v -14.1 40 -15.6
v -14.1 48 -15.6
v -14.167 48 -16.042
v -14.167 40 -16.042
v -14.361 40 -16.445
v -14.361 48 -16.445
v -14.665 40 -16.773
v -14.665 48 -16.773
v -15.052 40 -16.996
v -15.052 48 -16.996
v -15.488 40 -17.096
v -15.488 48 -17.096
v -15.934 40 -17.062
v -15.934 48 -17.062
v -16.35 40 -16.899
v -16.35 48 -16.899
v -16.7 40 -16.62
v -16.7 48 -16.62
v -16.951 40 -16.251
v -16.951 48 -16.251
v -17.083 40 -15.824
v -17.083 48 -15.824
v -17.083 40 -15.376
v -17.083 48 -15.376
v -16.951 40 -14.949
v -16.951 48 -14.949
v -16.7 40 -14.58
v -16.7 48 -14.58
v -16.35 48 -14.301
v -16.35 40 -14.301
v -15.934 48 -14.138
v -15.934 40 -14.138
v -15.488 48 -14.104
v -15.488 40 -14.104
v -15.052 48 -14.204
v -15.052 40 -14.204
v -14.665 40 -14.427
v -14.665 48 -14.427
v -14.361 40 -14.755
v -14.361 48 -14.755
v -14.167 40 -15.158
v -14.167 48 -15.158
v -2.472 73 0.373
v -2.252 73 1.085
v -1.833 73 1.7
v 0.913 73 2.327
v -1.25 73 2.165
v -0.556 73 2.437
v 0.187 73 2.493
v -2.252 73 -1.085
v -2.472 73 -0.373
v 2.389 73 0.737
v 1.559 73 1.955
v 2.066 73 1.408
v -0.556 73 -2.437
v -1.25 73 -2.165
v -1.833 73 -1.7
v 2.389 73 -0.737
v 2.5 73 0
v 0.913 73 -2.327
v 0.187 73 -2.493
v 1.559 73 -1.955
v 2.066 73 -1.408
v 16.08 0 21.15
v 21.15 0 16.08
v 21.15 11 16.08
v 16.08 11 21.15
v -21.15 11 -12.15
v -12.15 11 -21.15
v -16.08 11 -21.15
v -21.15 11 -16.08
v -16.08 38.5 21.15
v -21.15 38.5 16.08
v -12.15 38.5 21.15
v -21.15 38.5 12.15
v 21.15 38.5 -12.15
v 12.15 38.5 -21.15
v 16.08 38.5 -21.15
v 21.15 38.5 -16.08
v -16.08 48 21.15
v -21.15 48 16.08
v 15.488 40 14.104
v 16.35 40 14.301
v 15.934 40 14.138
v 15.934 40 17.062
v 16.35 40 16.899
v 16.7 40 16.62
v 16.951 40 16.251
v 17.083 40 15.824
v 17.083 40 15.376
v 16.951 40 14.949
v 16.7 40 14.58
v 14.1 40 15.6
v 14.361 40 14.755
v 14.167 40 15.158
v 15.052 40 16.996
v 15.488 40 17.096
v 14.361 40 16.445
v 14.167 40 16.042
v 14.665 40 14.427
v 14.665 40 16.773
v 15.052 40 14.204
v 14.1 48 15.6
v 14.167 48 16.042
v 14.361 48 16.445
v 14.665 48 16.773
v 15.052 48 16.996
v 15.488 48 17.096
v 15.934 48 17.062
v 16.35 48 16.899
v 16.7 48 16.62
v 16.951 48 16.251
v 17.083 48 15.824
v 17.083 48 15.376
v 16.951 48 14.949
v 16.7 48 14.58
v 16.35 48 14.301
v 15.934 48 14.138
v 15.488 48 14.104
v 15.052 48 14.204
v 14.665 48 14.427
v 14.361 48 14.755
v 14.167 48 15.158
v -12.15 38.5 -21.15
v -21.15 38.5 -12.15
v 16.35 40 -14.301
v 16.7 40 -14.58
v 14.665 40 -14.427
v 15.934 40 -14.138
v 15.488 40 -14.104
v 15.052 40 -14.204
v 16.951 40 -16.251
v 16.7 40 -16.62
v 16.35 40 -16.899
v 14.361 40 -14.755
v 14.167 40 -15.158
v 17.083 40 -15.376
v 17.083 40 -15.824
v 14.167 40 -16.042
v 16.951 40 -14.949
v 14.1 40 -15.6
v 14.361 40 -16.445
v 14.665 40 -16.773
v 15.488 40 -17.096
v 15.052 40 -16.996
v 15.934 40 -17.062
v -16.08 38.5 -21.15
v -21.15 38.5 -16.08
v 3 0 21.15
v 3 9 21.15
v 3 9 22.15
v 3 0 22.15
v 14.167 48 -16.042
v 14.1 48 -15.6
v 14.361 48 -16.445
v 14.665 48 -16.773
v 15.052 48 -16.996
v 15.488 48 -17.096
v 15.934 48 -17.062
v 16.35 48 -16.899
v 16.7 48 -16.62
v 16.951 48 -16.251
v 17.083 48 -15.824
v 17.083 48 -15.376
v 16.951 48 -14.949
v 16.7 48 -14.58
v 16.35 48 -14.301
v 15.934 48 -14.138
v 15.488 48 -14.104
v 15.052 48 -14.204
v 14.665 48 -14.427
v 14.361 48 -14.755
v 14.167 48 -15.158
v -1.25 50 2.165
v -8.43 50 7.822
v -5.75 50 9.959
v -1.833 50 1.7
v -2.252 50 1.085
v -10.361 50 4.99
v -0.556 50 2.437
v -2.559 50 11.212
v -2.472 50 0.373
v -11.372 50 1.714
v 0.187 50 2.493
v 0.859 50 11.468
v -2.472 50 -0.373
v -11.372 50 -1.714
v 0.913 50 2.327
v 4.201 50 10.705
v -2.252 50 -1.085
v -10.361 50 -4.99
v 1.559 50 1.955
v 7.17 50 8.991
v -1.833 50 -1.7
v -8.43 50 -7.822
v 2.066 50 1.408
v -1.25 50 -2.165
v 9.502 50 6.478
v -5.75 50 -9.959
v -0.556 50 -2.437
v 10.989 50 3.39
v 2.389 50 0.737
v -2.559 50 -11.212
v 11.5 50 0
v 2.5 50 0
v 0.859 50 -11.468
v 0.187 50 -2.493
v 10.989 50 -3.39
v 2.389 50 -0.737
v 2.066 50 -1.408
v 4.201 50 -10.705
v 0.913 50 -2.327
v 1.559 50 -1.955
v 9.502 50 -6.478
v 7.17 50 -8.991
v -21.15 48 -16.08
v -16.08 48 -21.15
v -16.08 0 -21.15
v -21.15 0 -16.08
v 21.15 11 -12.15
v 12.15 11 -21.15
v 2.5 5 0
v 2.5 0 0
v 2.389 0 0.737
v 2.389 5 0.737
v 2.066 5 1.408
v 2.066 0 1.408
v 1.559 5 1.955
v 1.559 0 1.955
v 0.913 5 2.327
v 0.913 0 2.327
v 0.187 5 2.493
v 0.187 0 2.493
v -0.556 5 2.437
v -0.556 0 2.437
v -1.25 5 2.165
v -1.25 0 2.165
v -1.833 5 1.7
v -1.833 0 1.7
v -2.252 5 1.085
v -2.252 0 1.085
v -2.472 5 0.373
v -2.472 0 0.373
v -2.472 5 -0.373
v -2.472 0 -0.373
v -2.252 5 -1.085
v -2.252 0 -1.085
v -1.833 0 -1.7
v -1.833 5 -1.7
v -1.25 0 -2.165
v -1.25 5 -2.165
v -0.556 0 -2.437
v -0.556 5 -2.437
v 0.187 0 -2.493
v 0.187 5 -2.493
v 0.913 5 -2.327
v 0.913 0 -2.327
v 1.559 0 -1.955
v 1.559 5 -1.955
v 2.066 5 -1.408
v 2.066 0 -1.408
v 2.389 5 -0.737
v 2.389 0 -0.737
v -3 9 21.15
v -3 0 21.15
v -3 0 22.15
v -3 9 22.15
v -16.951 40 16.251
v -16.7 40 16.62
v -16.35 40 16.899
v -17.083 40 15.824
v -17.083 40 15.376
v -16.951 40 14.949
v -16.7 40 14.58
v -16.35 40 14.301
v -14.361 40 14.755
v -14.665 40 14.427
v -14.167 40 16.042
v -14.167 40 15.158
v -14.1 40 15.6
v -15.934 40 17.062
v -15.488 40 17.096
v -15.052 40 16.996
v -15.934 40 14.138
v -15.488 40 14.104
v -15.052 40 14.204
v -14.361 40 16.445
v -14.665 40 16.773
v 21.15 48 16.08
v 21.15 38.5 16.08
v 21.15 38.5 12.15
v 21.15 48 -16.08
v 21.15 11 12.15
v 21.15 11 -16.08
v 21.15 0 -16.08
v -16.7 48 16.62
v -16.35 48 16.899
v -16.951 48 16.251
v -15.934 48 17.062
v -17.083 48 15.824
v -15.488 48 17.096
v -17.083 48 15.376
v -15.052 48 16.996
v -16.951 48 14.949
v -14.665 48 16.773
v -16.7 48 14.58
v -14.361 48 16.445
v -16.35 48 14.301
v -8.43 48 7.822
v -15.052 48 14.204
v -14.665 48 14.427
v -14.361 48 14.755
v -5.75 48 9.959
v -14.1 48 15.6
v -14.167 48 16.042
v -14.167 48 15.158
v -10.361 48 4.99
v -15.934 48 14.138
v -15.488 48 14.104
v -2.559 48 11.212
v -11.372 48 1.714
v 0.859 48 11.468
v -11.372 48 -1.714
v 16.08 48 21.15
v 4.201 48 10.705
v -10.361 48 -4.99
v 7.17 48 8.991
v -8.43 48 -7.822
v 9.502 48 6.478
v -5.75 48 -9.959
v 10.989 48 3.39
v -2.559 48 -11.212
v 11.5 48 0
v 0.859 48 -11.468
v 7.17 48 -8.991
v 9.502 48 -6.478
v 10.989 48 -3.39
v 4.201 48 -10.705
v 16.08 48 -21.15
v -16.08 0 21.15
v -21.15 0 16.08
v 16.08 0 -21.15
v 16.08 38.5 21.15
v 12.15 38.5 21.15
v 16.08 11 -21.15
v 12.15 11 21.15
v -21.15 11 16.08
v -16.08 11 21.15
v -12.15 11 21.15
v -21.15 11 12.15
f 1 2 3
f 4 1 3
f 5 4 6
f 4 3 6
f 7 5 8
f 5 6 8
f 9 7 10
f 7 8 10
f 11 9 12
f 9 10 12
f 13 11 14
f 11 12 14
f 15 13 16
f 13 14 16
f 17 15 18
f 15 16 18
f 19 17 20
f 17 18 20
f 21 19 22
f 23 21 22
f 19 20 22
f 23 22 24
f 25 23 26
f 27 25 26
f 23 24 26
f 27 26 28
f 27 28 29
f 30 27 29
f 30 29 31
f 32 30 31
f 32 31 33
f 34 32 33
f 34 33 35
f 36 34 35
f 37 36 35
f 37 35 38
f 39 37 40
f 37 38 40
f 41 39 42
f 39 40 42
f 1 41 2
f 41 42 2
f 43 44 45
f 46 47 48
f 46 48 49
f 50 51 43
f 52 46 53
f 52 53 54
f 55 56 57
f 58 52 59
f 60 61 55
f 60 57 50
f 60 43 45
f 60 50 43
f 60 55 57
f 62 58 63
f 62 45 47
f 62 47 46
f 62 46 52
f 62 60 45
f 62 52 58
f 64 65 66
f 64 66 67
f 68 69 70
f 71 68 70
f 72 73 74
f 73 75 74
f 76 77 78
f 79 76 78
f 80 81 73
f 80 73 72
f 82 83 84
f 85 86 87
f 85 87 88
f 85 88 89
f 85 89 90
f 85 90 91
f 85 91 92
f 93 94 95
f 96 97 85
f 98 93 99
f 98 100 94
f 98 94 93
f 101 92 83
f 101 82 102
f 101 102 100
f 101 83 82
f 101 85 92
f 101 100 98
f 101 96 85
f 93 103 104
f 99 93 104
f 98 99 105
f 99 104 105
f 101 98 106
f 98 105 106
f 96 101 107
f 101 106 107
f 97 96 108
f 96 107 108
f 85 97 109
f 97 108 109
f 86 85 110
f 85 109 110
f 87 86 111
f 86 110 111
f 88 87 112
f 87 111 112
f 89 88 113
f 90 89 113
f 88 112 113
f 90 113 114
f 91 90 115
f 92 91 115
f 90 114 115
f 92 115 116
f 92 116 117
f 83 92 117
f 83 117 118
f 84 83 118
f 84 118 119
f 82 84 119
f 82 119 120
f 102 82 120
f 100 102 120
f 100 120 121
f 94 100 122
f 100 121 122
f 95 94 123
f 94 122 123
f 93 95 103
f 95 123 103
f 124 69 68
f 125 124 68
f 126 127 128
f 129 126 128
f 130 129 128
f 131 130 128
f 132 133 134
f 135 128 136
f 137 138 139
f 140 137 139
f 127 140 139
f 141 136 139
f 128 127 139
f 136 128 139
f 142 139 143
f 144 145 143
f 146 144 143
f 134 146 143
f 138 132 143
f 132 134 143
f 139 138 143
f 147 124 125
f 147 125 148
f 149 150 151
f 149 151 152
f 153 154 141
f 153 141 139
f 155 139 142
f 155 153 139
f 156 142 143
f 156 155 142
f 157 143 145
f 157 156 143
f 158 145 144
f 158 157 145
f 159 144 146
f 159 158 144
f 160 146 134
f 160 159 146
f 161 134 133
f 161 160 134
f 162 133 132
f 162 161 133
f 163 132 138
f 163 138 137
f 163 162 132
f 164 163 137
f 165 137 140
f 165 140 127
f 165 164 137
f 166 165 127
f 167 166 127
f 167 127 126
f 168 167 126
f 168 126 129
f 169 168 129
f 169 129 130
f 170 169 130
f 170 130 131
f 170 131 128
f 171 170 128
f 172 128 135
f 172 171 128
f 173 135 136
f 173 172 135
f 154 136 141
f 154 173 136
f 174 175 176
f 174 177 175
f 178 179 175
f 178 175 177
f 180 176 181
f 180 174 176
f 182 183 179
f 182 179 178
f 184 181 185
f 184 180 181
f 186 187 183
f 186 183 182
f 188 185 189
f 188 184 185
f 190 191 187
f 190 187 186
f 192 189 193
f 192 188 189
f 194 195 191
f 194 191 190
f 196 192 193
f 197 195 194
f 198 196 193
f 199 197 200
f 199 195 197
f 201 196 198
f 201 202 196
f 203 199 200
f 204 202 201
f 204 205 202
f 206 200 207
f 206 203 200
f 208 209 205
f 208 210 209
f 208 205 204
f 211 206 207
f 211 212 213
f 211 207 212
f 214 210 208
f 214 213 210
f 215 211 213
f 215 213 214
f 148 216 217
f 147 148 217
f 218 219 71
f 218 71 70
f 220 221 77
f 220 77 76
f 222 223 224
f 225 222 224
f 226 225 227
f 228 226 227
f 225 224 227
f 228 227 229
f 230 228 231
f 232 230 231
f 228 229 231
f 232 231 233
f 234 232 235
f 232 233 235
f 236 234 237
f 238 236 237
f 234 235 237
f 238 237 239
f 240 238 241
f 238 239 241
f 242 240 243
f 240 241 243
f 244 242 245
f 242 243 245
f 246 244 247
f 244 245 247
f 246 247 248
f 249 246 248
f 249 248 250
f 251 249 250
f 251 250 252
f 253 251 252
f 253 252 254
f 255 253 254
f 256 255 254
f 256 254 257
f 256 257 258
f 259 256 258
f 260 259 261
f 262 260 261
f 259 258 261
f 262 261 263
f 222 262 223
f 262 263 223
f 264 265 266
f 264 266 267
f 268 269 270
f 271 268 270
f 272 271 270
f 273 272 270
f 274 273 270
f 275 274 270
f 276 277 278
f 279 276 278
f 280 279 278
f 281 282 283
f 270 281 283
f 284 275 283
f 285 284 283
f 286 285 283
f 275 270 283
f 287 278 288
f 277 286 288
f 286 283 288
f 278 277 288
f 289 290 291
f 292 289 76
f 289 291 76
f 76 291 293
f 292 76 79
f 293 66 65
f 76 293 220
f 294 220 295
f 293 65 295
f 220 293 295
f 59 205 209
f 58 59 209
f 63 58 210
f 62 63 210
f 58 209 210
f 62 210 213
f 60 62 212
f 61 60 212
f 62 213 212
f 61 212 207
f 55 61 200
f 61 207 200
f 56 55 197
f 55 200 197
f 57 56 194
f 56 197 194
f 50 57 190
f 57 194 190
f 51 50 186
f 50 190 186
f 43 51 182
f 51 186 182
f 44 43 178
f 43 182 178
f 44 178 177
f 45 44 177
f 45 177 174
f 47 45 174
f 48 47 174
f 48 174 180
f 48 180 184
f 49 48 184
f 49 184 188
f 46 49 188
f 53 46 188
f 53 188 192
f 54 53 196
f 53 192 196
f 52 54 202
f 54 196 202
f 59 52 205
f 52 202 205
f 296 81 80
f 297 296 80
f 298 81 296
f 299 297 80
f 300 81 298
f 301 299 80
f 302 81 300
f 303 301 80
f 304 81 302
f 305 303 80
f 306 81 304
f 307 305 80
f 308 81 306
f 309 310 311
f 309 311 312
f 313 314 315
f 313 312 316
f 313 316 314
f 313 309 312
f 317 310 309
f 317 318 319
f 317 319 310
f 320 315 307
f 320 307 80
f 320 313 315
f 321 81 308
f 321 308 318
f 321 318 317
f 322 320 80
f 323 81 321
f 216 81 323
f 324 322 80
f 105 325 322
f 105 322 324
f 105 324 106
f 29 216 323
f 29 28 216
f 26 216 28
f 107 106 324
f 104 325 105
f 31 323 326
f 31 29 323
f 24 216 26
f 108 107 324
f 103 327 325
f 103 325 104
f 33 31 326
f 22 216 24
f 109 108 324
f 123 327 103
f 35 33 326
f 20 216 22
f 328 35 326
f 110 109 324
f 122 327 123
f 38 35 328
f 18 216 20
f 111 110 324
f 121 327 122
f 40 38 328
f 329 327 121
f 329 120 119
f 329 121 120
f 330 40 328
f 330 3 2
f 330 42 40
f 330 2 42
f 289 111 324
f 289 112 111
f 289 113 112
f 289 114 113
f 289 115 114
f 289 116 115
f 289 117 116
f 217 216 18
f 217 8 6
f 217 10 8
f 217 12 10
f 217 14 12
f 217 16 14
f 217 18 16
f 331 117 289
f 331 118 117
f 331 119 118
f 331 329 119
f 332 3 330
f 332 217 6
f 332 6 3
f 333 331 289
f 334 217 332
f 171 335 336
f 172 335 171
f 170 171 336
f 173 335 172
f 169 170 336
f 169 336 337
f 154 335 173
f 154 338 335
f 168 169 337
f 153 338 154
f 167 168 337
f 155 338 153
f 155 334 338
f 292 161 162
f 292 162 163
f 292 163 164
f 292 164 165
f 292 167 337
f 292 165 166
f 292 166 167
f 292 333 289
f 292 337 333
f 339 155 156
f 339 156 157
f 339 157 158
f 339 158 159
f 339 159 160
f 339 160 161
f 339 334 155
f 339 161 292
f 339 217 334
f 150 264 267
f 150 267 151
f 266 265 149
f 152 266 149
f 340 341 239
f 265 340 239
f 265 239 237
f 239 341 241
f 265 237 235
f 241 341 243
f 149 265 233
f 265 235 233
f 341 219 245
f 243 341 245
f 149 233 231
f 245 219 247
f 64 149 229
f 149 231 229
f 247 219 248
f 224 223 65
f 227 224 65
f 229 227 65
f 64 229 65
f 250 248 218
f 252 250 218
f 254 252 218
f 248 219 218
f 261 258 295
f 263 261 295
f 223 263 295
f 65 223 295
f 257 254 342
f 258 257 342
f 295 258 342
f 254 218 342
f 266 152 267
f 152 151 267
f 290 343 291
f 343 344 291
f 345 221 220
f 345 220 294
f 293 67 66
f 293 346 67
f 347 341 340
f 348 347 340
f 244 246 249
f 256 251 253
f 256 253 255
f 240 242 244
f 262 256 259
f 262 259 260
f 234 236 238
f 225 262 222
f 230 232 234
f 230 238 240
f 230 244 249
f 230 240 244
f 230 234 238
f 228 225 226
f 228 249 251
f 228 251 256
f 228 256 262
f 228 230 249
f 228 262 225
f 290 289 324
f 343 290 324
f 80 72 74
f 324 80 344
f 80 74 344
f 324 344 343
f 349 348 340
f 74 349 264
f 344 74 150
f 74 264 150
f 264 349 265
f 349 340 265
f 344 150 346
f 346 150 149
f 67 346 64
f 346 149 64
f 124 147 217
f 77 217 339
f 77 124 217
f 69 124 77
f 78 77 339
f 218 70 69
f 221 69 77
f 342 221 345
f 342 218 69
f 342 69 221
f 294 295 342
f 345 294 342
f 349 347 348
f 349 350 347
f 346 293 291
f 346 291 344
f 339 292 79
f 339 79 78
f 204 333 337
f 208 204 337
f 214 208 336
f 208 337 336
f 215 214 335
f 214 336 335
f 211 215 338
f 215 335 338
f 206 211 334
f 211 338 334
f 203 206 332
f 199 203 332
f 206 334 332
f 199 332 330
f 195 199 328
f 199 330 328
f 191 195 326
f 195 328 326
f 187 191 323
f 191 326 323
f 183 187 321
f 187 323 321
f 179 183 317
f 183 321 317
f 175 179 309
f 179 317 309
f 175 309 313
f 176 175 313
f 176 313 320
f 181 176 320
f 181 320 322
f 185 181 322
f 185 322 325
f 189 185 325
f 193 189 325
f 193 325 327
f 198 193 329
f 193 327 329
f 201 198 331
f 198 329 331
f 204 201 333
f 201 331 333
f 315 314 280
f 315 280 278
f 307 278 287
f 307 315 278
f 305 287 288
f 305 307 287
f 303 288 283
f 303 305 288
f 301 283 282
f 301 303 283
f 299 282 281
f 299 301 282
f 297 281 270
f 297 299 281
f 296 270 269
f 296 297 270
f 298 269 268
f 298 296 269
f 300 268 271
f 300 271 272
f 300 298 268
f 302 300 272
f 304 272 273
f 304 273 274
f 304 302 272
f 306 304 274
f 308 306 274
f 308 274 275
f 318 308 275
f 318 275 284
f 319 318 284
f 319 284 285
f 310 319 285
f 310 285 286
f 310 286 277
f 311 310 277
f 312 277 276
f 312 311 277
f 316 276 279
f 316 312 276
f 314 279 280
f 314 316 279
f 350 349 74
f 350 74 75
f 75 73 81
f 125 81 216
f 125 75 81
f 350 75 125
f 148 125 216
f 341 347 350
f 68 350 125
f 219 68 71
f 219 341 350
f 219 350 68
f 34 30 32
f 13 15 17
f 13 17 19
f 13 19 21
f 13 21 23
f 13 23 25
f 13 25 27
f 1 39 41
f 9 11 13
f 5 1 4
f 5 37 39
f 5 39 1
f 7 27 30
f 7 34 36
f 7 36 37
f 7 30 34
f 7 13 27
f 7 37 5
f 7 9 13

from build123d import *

# Parameters (mm, degrees)
SKETCH1_W               = 42.3
SKETCH1_H               = 42.3
BOSS_EXTRUDE1_DEPTH     = 48
SKETCH2_R               = 11.5
BOSS_EXTRUDE2_DEPTH     = 2
SKETCH3_R               = 2.5
BOSS_EXTRUDE3_DEPTH     = 23
SKETCH4_R               = 1.5
CUT_EXTRUDE1_DEPTH      = 8
MIRROR3_COPY_1_SKETCH_R = 1.5
MIRROR3_COPY_1_DEPTH    = 8
CUT_EXTRUDE2_DEPTH      = 9.5
MIRROR5_COPY_1_DEPTH    = 9.5
SKETCH7_R               = 2.5
CUT_EXTRUDE5_DEPTH      = 5
CUT_EXTRUDE6_DEPTH      = 11
MIRROR7_COPY_1_DEPTH    = 11
CUT_EXTRUDE7_DEPTH      = 27.5
CUT_EXTRUDE8_DEPTH      = 27.5
CUT_EXTRUDE9_DEPTH      = 27.5
CUT_EXTRUDE10_DEPTH     = 27.5
BOSS_EXTRUDE4_DEPTH     = 1


with BuildPart() as part:
    # Sketch1 → Boss-Extrude1 (new body)
    with BuildSketch(Plane(origin=(0, 0, 0), x_dir=(1, 0, 0), z_dir=(0, 1, 0))):
        Rectangle(SKETCH1_W, SKETCH1_H)
    extrude(amount=BOSS_EXTRUDE1_DEPTH)

    # Sketch2 → Boss-Extrude2 (add)
    with BuildSketch(Plane(origin=(0, 48, 0), x_dir=(1, 0, 0), z_dir=(0, 1, 0))):
        Circle(SKETCH2_R)
    extrude(amount=BOSS_EXTRUDE2_DEPTH)

    # Sketch3 → Boss-Extrude3 (add)
    with BuildSketch(Plane(origin=(0, 50, 0), x_dir=(1, 0, 0), z_dir=(0, 1, 0))):
        Circle(SKETCH3_R)
    extrude(amount=BOSS_EXTRUDE3_DEPTH)

    # Sketch4 → Cut-Extrude1 (cut)
    with BuildSketch(Plane(origin=(0, 48, 0), x_dir=(1, 0, 0), z_dir=(0, 1, 0))):
        with Locations((-15.6, 15.6)):
            Circle(SKETCH4_R)
    cut_extrude1 = extrude(amount=-CUT_EXTRUDE1_DEPTH, mode=Mode.SUBTRACT)

    # Mirror1: Cut-Extrude1 across plane
    add(cut_extrude1.mirror(Plane(origin=(0, 0, 0), x_dir=(0, 0, 1), z_dir=(1, 0, 0))), mode=Mode.SUBTRACT)

    # Mirror3: Cut-Extrude1 across plane
    add(cut_extrude1.mirror(Plane.XY), mode=Mode.SUBTRACT)

    # Mirror3 copy 1 sketch → Mirror3 copy 1 (cut)
    with BuildSketch(Plane(origin=(0, 48, 0), x_dir=(-1, 0, 0), z_dir=(0, 1, 0))):
        with Locations((-15.6, 15.6)):
            Circle(MIRROR3_COPY_1_SKETCH_R)
    extrude(amount=-MIRROR3_COPY_1_DEPTH, mode=Mode.SUBTRACT)

    # Sketch6 → Cut-Extrude2 (cut)
    with BuildSketch(Plane(origin=(0, 48, 0), x_dir=(1, 0, 0), z_dir=(0, 1, 0))):
        Polygon((-21.15, 21.15), (-21.15, 16.08), (-16.08, 21.15), align=None)
    cut_extrude2 = extrude(amount=-CUT_EXTRUDE2_DEPTH, mode=Mode.SUBTRACT)

    # Mirror4: Cut-Extrude2 across plane
    add(cut_extrude2.mirror(Plane(origin=(0, 0, 0), x_dir=(0, 0, 1), z_dir=(1, 0, 0))), mode=Mode.SUBTRACT)

    # Mirror5: Cut-Extrude2 across plane
    add(cut_extrude2.mirror(Plane.XY), mode=Mode.SUBTRACT)

    # Mirror5 copy 1 sketch → Mirror5 copy 1 (cut)
    with BuildSketch(Plane(origin=(0, 48, 0), x_dir=(-1, 0, 0), z_dir=(0, 1, 0))):
        Polygon((-21.15, 21.15), (-21.15, 16.08), (-16.08, 21.15), align=None)
    extrude(amount=-MIRROR5_COPY_1_DEPTH, mode=Mode.SUBTRACT)

    # Sketch7 → Cut-Extrude5 (cut)
    with BuildSketch(Plane.XZ):
        Circle(SKETCH7_R)
    extrude(amount=-CUT_EXTRUDE5_DEPTH, mode=Mode.SUBTRACT)

    # Sketch8 → Cut-Extrude6 (cut)
    with BuildSketch(Plane.XZ):
        Polygon((-21.15, 21.15), (-21.15, 16.08), (-16.08, 21.15), align=None)
    cut_extrude6 = extrude(amount=-CUT_EXTRUDE6_DEPTH, mode=Mode.SUBTRACT)

    # Mirror6: Cut-Extrude6 across plane
    add(cut_extrude6.mirror(Plane(origin=(0, 0, 0), x_dir=(0, 0, 1), z_dir=(1, 0, 0))), mode=Mode.SUBTRACT)

    # Mirror7: Cut-Extrude6 across plane
    add(cut_extrude6.mirror(Plane.XY), mode=Mode.SUBTRACT)

    # Mirror7 copy 1 sketch → Mirror7 copy 1 (cut)
    with BuildSketch(Plane(origin=(0, 0, 0), x_dir=(-1, 0, 0), z_dir=(0, -1, 0))):
        Polygon((-21.15, 21.15), (-21.15, 16.08), (-16.08, 21.15), align=None)
    extrude(amount=-MIRROR7_COPY_1_DEPTH, mode=Mode.SUBTRACT)

    # Sketch10 → Cut-Extrude7 (cut)
    with BuildSketch(Plane(origin=(0, 38.5, 0), x_dir=(1, 0, 0), z_dir=(0, 1, 0))):
        Polygon((-21.15, 21.15), (-12.15, 21.15), (-21.15, 12.15), align=None)
    extrude(amount=-CUT_EXTRUDE7_DEPTH, mode=Mode.SUBTRACT)

    # Sketch11 → Cut-Extrude8 (cut)
    with BuildSketch(Plane(origin=(0, 38.5, 0), x_dir=(1, 0, 0), z_dir=(0, 1, 0))):
        Polygon((21.15, 21.15), (12.15, 21.15), (21.15, 12.15), align=None)
    extrude(amount=-CUT_EXTRUDE8_DEPTH, mode=Mode.SUBTRACT)

    # Sketch12 → Cut-Extrude9 (cut)
    with BuildSketch(Plane(origin=(0, 38.5, 0), x_dir=(1, 0, 0), z_dir=(0, 1, 0))):
        Polygon((-21.15, -21.15), (-12.15, -21.15), (-21.15, -12.15), align=None)
    extrude(amount=-CUT_EXTRUDE9_DEPTH, mode=Mode.SUBTRACT)

    # Sketch13 → Cut-Extrude10 (cut)
    with BuildSketch(Plane(origin=(0, 38.5, 0), x_dir=(1, 0, 0), z_dir=(0, 1, 0))):
        Polygon((21.15, -21.15), (21.15, -12.15), (12.15, -21.15), align=None)
    extrude(amount=-CUT_EXTRUDE10_DEPTH, mode=Mode.SUBTRACT)

    # Sketch14 → Boss-Extrude4 (add)
    with BuildSketch(Plane.XY.offset(21.15)):
        Polygon((0, 0), (-3, 0), (-3, 9), (3, 9), (3, 0), align=None)
    extrude(amount=BOSS_EXTRUDE4_DEPTH)


solid = part.part
